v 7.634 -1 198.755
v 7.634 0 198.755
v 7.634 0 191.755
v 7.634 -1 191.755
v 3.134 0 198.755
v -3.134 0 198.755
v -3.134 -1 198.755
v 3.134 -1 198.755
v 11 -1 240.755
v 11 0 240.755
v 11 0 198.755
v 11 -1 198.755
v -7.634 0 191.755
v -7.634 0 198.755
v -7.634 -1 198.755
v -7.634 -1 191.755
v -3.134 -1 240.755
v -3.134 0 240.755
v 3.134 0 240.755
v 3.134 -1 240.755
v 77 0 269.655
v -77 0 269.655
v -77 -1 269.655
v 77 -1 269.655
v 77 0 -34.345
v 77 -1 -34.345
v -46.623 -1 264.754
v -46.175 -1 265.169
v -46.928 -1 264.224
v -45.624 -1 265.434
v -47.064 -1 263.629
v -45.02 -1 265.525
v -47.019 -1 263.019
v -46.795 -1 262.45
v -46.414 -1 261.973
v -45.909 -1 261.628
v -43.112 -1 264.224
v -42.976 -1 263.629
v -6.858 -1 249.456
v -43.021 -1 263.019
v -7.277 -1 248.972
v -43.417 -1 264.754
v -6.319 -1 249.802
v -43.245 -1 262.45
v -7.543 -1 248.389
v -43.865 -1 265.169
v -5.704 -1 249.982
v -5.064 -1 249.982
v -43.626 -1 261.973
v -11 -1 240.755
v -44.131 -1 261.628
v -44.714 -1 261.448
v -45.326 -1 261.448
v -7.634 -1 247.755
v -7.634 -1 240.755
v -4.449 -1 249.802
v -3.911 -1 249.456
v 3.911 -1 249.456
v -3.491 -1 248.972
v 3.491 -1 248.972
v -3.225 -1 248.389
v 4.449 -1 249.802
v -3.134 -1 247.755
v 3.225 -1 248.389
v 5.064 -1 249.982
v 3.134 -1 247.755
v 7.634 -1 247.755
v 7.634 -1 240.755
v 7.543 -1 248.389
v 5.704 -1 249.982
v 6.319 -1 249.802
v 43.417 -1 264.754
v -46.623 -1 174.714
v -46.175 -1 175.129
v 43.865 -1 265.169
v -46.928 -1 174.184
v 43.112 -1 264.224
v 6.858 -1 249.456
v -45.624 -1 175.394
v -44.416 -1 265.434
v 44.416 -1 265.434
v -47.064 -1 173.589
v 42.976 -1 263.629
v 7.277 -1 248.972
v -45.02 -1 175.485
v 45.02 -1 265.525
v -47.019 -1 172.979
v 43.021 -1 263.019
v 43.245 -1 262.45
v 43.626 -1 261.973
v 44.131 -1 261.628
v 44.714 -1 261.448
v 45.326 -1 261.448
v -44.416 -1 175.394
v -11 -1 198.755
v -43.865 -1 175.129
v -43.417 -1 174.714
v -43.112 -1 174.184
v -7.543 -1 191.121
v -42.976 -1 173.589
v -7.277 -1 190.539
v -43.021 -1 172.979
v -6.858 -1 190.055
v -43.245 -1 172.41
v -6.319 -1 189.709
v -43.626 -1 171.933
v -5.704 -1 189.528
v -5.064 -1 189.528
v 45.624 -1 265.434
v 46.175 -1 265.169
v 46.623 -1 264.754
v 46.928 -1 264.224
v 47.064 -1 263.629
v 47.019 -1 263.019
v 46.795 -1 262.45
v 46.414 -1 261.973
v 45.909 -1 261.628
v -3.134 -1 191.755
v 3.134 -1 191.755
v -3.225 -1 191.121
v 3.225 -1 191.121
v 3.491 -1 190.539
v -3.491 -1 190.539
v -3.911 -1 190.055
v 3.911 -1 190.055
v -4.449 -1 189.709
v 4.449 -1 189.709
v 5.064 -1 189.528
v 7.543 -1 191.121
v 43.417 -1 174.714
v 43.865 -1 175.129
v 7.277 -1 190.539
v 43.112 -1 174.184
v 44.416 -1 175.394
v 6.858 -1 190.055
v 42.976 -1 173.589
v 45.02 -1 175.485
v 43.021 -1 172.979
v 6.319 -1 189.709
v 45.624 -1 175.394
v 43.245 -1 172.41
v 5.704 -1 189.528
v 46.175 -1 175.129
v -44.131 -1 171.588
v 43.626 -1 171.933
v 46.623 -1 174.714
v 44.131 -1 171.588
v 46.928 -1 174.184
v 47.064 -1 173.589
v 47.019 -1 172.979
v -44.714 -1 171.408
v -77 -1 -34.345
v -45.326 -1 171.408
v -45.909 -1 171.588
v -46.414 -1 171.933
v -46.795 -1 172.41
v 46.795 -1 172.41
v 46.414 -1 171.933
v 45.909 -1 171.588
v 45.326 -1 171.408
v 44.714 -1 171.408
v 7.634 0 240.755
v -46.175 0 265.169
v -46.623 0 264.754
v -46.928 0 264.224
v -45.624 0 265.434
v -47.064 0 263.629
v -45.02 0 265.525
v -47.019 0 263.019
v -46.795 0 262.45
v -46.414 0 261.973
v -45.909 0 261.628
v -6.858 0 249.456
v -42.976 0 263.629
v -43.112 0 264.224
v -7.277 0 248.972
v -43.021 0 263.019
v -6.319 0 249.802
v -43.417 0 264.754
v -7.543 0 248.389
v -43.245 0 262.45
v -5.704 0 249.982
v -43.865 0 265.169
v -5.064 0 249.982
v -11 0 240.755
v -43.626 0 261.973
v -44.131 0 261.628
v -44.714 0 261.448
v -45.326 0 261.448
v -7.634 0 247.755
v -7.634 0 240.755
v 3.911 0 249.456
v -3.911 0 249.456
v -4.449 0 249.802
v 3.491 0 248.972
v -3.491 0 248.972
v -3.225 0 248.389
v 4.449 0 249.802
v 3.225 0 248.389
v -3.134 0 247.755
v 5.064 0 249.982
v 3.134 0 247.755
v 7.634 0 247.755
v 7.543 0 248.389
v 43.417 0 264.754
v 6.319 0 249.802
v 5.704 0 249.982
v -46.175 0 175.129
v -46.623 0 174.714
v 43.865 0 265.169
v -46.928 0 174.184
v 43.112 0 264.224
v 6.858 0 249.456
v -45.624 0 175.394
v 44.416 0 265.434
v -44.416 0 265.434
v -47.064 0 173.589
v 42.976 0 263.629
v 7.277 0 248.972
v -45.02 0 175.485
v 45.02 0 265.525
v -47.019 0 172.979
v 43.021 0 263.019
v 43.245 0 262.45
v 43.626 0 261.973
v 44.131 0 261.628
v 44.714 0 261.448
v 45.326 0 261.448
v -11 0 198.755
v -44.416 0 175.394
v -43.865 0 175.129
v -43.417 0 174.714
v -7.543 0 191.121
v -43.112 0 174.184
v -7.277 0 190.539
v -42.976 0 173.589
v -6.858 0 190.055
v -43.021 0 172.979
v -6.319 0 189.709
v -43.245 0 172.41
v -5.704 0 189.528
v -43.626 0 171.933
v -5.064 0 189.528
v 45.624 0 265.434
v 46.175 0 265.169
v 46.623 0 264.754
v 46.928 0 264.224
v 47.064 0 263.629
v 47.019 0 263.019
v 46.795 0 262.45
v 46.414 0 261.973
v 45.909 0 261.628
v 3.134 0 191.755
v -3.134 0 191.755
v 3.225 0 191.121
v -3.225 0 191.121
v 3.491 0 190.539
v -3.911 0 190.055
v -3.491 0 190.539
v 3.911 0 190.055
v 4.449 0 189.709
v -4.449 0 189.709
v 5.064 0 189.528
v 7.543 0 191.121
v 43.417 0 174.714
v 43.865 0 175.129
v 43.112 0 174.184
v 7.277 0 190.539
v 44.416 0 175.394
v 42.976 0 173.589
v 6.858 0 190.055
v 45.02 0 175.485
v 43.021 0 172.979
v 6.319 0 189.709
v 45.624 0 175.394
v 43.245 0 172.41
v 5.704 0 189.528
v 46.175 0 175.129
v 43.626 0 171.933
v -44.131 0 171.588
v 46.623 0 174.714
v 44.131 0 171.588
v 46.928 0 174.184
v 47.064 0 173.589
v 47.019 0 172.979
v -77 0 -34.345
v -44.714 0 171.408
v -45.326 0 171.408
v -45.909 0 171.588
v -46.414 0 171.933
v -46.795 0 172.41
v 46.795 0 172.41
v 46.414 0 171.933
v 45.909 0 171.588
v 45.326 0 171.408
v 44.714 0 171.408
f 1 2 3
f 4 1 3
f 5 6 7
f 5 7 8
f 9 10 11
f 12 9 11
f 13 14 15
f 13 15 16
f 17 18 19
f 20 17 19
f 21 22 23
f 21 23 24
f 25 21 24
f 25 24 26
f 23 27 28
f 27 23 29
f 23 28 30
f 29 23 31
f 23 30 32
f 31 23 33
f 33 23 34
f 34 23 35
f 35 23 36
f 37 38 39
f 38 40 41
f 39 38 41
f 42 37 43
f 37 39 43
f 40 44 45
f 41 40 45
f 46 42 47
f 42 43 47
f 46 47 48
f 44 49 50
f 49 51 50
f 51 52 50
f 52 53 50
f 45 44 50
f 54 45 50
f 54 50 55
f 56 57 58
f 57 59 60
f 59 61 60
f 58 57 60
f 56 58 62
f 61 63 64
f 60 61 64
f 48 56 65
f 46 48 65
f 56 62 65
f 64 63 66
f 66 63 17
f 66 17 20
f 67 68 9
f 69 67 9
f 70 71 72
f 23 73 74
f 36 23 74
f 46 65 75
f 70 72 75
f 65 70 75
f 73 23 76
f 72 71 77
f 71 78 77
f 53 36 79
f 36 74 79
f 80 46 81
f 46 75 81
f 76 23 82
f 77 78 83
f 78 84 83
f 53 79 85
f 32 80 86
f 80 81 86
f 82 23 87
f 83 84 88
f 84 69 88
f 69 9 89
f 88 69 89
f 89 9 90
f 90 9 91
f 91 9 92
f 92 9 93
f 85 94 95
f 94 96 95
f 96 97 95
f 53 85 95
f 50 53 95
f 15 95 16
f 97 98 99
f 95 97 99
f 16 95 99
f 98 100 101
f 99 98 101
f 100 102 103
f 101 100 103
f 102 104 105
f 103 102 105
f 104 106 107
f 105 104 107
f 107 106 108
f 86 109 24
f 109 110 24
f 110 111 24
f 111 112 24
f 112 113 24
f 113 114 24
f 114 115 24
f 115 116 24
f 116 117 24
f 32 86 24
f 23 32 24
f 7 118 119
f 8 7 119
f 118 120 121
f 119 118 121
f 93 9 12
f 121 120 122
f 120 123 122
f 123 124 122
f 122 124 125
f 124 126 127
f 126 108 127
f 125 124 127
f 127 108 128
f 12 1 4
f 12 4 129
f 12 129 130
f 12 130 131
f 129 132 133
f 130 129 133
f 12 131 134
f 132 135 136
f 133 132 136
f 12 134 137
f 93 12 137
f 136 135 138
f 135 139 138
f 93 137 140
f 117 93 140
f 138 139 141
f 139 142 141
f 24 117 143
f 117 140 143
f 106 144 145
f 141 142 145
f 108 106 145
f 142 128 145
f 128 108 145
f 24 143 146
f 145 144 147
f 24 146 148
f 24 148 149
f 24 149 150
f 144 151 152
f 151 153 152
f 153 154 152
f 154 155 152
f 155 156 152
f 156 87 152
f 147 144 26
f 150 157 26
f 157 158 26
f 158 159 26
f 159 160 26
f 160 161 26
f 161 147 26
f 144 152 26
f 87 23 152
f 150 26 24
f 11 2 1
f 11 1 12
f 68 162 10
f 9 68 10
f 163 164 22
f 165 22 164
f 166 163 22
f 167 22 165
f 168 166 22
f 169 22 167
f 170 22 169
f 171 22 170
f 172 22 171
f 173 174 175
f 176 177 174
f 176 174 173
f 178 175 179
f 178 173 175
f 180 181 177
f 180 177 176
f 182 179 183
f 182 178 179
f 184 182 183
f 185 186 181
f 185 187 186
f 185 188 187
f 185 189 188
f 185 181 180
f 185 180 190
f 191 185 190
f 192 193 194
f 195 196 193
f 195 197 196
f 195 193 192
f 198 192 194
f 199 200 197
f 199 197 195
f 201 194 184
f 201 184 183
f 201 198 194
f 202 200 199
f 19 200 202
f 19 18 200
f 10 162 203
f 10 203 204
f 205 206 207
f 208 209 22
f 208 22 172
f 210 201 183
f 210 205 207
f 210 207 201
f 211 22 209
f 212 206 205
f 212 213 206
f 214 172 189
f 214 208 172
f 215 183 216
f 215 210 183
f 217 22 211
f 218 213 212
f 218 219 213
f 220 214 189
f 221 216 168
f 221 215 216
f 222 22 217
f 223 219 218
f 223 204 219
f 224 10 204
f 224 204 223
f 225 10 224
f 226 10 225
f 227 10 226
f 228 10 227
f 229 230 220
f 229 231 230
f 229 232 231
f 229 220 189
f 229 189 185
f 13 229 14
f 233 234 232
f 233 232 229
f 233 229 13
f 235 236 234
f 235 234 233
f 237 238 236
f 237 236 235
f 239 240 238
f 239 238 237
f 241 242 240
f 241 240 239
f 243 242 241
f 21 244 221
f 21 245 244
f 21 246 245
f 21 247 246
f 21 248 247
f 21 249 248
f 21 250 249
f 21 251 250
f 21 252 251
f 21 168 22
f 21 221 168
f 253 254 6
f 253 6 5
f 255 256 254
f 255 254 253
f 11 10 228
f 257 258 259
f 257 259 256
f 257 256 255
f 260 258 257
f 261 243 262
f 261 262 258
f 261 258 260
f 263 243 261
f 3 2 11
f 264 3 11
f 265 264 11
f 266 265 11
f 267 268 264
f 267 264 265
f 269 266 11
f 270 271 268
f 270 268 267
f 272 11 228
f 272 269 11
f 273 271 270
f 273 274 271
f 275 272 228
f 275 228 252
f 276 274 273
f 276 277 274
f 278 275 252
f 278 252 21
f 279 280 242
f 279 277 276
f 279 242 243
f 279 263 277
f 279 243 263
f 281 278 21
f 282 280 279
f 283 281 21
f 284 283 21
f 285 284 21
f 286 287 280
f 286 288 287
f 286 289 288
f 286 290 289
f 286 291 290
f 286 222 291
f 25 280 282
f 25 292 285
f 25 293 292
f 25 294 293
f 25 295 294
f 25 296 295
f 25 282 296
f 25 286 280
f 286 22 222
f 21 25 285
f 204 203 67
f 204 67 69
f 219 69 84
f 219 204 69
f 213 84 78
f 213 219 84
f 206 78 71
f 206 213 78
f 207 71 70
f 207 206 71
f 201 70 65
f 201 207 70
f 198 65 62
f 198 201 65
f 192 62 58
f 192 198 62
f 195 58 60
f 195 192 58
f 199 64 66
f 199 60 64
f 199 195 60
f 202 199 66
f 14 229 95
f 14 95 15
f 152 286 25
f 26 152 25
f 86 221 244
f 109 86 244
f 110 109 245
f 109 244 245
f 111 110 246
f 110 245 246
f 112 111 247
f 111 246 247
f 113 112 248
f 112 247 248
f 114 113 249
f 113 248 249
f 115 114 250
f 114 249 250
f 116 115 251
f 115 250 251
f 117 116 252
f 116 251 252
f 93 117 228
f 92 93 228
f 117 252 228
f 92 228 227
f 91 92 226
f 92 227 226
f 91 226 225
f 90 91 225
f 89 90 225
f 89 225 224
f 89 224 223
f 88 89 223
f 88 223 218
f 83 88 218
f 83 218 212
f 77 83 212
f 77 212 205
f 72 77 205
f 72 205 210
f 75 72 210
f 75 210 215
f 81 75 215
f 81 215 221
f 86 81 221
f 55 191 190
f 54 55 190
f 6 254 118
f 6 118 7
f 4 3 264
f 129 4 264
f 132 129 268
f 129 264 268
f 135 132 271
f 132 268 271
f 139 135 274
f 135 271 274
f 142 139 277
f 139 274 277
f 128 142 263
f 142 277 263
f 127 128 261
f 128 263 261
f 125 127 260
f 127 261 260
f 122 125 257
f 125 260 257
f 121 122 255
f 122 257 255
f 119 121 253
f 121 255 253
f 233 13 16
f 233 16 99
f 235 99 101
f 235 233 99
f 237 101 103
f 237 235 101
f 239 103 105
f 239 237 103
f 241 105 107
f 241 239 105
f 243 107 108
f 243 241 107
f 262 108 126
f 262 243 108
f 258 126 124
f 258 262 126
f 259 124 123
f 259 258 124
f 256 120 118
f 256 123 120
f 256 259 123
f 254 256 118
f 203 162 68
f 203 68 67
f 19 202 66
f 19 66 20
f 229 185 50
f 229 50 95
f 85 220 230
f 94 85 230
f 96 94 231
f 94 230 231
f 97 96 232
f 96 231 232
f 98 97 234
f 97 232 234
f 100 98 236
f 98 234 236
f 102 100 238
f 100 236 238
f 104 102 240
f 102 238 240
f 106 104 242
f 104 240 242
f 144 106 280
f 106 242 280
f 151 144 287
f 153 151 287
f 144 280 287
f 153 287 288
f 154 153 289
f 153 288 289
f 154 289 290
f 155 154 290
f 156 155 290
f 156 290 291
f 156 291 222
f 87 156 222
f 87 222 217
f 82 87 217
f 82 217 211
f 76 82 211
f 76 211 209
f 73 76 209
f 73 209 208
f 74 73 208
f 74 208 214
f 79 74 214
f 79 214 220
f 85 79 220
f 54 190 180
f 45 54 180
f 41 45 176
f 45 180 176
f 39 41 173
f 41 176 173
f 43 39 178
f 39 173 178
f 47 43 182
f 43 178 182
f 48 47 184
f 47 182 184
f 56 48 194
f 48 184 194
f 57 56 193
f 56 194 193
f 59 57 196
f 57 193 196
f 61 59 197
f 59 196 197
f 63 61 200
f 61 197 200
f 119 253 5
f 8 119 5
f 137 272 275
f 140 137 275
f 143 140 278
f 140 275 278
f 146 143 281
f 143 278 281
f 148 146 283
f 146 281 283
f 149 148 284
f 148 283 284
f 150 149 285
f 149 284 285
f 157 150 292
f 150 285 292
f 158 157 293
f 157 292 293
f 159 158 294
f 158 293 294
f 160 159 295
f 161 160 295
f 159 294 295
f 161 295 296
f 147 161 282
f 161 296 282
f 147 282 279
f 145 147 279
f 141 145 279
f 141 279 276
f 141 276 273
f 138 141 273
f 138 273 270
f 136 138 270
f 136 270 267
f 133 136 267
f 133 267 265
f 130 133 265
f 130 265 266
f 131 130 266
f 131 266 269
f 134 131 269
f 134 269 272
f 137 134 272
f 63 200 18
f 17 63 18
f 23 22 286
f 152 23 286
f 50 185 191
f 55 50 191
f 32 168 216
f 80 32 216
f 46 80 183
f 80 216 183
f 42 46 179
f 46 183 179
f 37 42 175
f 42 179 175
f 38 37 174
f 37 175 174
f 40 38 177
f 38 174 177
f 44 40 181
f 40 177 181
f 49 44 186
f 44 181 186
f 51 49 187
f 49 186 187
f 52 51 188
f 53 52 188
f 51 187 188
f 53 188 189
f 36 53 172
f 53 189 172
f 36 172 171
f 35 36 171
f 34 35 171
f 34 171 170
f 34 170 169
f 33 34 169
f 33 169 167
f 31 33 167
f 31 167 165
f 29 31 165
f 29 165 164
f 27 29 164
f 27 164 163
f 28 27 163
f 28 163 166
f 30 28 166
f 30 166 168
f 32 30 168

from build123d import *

# Parameters (mm, degrees)
SKETCH1_W               = 154
SKETCH1_H               = 304
BASE_FLANGE1_DEPTH      = 1
SKETCH4_W               = 22
SKETCH4_H               = 42
CUT_EXTRUDE3_DEPTH      = 10
MIRROR2_COPY_1_SKETCH_W = 22
MIRROR2_COPY_1_SKETCH_H = 42
MIRROR2_COPY_1_DEPTH    = 10
SKETCH2_R               = 2.05
CUT_EXTRUDE4_DEPTH      = 10


# Sheet-metal steps are written as plain solids
with BuildPart() as part:
    # Sketch1 → Base-Flange1 (new body)
    with BuildSketch(Plane(origin=(0, 0, 0), x_dir=(1, 0, 0), z_dir=(0, 1, 0))):
        with Locations((0, -117.655376963)):
            Rectangle(SKETCH1_W, SKETCH1_H)
    extrude(amount=-BASE_FLANGE1_DEPTH)

    # Sketch4 → Cut-Extrude3 (cut)
    with BuildSketch(Plane(origin=(0, 0, 0), x_dir=(1, 0, 0), z_dir=(0, 1, 0))):
        with Locations((0, -219.755376963)):
            Rectangle(SKETCH4_W, SKETCH4_H)
        with BuildLine():
            Line((-7.634176778, -205.755376963), (-7.634176778, -191.755376963))
            ThreePointArc((-7.634176778, -191.755376963), (-5.384176778, -189.505376963), (-3.134176778, -191.755376963))
            Line((-3.134176778, -191.755376963), (-3.134176778, -205.755376963))
            ThreePointArc((-3.134176778, -205.755376963), (-5.384176778, -208.005376963), (-7.634176778, -205.755376963))
        make_face()
    cut_extrude3 = extrude(amount=-CUT_EXTRUDE3_DEPTH, mode=Mode.SUBTRACT)

    # Mirror1: Cut-Extrude3 across plane
    add(cut_extrude3.mirror(Plane(origin=(0, 0, 0), x_dir=(0, 0, 1), z_dir=(1, 0, 0))), mode=Mode.SUBTRACT)

    # Mirror2: Cut-Extrude3 across plane
    add(cut_extrude3.mirror(Plane(origin=(0, 0, 219.755376963), x_dir=(1, 0, 0), z_dir=(0, 0, -1))), mode=Mode.SUBTRACT)

    # Mirror2 copy 1 sketch → Mirror2 copy 1 (cut)
    with BuildSketch(Plane(origin=(0, 0, 439.510753926), x_dir=(-1, 0, 0), z_dir=(0, 1, 0))):
        with Locations((0, -219.755376963)):
            Rectangle(MIRROR2_COPY_1_SKETCH_W, MIRROR2_COPY_1_SKETCH_H)
        with BuildLine():
            Line((-7.634176778, -205.755376963), (-7.634176778, -191.755376963))
            ThreePointArc((-7.634176778, -191.755376963), (-5.384176778, -189.505376963), (-3.134176778, -191.755376963))
            Line((-3.134176778, -191.755376963), (-3.134176778, -205.755376963))
            ThreePointArc((-3.134176778, -205.755376963), (-5.384176778, -208.005376963), (-7.634176778, -205.755376963))
        make_face()
    extrude(amount=-MIRROR2_COPY_1_DEPTH, mode=Mode.SUBTRACT)

    # Sketch2 → Cut-Extrude4 (cut)
    with BuildSketch(Plane(origin=(0, 0, 0), x_dir=(1, 0, 0), z_dir=(0, 1, 0))):
        with Locations(Location((-45.02, -263.475376963, 0), (0, 0, 270))):
            Circle(SKETCH2_R)
        with Locations(Location((-45.02, -173.435376963, 0), (0, 0, 270))):
            Circle(SKETCH2_R)
        with Locations(Location((45.02, -173.435376963, 0), (0, 0, 270))):
            Circle(SKETCH2_R)
        with Locations(Location((45.02, -263.475376963, 0), (0, 0, 270))):
            Circle(SKETCH2_R)
    extrude(amount=-CUT_EXTRUDE4_DEPTH, mode=Mode.SUBTRACT)


solid = part.part
